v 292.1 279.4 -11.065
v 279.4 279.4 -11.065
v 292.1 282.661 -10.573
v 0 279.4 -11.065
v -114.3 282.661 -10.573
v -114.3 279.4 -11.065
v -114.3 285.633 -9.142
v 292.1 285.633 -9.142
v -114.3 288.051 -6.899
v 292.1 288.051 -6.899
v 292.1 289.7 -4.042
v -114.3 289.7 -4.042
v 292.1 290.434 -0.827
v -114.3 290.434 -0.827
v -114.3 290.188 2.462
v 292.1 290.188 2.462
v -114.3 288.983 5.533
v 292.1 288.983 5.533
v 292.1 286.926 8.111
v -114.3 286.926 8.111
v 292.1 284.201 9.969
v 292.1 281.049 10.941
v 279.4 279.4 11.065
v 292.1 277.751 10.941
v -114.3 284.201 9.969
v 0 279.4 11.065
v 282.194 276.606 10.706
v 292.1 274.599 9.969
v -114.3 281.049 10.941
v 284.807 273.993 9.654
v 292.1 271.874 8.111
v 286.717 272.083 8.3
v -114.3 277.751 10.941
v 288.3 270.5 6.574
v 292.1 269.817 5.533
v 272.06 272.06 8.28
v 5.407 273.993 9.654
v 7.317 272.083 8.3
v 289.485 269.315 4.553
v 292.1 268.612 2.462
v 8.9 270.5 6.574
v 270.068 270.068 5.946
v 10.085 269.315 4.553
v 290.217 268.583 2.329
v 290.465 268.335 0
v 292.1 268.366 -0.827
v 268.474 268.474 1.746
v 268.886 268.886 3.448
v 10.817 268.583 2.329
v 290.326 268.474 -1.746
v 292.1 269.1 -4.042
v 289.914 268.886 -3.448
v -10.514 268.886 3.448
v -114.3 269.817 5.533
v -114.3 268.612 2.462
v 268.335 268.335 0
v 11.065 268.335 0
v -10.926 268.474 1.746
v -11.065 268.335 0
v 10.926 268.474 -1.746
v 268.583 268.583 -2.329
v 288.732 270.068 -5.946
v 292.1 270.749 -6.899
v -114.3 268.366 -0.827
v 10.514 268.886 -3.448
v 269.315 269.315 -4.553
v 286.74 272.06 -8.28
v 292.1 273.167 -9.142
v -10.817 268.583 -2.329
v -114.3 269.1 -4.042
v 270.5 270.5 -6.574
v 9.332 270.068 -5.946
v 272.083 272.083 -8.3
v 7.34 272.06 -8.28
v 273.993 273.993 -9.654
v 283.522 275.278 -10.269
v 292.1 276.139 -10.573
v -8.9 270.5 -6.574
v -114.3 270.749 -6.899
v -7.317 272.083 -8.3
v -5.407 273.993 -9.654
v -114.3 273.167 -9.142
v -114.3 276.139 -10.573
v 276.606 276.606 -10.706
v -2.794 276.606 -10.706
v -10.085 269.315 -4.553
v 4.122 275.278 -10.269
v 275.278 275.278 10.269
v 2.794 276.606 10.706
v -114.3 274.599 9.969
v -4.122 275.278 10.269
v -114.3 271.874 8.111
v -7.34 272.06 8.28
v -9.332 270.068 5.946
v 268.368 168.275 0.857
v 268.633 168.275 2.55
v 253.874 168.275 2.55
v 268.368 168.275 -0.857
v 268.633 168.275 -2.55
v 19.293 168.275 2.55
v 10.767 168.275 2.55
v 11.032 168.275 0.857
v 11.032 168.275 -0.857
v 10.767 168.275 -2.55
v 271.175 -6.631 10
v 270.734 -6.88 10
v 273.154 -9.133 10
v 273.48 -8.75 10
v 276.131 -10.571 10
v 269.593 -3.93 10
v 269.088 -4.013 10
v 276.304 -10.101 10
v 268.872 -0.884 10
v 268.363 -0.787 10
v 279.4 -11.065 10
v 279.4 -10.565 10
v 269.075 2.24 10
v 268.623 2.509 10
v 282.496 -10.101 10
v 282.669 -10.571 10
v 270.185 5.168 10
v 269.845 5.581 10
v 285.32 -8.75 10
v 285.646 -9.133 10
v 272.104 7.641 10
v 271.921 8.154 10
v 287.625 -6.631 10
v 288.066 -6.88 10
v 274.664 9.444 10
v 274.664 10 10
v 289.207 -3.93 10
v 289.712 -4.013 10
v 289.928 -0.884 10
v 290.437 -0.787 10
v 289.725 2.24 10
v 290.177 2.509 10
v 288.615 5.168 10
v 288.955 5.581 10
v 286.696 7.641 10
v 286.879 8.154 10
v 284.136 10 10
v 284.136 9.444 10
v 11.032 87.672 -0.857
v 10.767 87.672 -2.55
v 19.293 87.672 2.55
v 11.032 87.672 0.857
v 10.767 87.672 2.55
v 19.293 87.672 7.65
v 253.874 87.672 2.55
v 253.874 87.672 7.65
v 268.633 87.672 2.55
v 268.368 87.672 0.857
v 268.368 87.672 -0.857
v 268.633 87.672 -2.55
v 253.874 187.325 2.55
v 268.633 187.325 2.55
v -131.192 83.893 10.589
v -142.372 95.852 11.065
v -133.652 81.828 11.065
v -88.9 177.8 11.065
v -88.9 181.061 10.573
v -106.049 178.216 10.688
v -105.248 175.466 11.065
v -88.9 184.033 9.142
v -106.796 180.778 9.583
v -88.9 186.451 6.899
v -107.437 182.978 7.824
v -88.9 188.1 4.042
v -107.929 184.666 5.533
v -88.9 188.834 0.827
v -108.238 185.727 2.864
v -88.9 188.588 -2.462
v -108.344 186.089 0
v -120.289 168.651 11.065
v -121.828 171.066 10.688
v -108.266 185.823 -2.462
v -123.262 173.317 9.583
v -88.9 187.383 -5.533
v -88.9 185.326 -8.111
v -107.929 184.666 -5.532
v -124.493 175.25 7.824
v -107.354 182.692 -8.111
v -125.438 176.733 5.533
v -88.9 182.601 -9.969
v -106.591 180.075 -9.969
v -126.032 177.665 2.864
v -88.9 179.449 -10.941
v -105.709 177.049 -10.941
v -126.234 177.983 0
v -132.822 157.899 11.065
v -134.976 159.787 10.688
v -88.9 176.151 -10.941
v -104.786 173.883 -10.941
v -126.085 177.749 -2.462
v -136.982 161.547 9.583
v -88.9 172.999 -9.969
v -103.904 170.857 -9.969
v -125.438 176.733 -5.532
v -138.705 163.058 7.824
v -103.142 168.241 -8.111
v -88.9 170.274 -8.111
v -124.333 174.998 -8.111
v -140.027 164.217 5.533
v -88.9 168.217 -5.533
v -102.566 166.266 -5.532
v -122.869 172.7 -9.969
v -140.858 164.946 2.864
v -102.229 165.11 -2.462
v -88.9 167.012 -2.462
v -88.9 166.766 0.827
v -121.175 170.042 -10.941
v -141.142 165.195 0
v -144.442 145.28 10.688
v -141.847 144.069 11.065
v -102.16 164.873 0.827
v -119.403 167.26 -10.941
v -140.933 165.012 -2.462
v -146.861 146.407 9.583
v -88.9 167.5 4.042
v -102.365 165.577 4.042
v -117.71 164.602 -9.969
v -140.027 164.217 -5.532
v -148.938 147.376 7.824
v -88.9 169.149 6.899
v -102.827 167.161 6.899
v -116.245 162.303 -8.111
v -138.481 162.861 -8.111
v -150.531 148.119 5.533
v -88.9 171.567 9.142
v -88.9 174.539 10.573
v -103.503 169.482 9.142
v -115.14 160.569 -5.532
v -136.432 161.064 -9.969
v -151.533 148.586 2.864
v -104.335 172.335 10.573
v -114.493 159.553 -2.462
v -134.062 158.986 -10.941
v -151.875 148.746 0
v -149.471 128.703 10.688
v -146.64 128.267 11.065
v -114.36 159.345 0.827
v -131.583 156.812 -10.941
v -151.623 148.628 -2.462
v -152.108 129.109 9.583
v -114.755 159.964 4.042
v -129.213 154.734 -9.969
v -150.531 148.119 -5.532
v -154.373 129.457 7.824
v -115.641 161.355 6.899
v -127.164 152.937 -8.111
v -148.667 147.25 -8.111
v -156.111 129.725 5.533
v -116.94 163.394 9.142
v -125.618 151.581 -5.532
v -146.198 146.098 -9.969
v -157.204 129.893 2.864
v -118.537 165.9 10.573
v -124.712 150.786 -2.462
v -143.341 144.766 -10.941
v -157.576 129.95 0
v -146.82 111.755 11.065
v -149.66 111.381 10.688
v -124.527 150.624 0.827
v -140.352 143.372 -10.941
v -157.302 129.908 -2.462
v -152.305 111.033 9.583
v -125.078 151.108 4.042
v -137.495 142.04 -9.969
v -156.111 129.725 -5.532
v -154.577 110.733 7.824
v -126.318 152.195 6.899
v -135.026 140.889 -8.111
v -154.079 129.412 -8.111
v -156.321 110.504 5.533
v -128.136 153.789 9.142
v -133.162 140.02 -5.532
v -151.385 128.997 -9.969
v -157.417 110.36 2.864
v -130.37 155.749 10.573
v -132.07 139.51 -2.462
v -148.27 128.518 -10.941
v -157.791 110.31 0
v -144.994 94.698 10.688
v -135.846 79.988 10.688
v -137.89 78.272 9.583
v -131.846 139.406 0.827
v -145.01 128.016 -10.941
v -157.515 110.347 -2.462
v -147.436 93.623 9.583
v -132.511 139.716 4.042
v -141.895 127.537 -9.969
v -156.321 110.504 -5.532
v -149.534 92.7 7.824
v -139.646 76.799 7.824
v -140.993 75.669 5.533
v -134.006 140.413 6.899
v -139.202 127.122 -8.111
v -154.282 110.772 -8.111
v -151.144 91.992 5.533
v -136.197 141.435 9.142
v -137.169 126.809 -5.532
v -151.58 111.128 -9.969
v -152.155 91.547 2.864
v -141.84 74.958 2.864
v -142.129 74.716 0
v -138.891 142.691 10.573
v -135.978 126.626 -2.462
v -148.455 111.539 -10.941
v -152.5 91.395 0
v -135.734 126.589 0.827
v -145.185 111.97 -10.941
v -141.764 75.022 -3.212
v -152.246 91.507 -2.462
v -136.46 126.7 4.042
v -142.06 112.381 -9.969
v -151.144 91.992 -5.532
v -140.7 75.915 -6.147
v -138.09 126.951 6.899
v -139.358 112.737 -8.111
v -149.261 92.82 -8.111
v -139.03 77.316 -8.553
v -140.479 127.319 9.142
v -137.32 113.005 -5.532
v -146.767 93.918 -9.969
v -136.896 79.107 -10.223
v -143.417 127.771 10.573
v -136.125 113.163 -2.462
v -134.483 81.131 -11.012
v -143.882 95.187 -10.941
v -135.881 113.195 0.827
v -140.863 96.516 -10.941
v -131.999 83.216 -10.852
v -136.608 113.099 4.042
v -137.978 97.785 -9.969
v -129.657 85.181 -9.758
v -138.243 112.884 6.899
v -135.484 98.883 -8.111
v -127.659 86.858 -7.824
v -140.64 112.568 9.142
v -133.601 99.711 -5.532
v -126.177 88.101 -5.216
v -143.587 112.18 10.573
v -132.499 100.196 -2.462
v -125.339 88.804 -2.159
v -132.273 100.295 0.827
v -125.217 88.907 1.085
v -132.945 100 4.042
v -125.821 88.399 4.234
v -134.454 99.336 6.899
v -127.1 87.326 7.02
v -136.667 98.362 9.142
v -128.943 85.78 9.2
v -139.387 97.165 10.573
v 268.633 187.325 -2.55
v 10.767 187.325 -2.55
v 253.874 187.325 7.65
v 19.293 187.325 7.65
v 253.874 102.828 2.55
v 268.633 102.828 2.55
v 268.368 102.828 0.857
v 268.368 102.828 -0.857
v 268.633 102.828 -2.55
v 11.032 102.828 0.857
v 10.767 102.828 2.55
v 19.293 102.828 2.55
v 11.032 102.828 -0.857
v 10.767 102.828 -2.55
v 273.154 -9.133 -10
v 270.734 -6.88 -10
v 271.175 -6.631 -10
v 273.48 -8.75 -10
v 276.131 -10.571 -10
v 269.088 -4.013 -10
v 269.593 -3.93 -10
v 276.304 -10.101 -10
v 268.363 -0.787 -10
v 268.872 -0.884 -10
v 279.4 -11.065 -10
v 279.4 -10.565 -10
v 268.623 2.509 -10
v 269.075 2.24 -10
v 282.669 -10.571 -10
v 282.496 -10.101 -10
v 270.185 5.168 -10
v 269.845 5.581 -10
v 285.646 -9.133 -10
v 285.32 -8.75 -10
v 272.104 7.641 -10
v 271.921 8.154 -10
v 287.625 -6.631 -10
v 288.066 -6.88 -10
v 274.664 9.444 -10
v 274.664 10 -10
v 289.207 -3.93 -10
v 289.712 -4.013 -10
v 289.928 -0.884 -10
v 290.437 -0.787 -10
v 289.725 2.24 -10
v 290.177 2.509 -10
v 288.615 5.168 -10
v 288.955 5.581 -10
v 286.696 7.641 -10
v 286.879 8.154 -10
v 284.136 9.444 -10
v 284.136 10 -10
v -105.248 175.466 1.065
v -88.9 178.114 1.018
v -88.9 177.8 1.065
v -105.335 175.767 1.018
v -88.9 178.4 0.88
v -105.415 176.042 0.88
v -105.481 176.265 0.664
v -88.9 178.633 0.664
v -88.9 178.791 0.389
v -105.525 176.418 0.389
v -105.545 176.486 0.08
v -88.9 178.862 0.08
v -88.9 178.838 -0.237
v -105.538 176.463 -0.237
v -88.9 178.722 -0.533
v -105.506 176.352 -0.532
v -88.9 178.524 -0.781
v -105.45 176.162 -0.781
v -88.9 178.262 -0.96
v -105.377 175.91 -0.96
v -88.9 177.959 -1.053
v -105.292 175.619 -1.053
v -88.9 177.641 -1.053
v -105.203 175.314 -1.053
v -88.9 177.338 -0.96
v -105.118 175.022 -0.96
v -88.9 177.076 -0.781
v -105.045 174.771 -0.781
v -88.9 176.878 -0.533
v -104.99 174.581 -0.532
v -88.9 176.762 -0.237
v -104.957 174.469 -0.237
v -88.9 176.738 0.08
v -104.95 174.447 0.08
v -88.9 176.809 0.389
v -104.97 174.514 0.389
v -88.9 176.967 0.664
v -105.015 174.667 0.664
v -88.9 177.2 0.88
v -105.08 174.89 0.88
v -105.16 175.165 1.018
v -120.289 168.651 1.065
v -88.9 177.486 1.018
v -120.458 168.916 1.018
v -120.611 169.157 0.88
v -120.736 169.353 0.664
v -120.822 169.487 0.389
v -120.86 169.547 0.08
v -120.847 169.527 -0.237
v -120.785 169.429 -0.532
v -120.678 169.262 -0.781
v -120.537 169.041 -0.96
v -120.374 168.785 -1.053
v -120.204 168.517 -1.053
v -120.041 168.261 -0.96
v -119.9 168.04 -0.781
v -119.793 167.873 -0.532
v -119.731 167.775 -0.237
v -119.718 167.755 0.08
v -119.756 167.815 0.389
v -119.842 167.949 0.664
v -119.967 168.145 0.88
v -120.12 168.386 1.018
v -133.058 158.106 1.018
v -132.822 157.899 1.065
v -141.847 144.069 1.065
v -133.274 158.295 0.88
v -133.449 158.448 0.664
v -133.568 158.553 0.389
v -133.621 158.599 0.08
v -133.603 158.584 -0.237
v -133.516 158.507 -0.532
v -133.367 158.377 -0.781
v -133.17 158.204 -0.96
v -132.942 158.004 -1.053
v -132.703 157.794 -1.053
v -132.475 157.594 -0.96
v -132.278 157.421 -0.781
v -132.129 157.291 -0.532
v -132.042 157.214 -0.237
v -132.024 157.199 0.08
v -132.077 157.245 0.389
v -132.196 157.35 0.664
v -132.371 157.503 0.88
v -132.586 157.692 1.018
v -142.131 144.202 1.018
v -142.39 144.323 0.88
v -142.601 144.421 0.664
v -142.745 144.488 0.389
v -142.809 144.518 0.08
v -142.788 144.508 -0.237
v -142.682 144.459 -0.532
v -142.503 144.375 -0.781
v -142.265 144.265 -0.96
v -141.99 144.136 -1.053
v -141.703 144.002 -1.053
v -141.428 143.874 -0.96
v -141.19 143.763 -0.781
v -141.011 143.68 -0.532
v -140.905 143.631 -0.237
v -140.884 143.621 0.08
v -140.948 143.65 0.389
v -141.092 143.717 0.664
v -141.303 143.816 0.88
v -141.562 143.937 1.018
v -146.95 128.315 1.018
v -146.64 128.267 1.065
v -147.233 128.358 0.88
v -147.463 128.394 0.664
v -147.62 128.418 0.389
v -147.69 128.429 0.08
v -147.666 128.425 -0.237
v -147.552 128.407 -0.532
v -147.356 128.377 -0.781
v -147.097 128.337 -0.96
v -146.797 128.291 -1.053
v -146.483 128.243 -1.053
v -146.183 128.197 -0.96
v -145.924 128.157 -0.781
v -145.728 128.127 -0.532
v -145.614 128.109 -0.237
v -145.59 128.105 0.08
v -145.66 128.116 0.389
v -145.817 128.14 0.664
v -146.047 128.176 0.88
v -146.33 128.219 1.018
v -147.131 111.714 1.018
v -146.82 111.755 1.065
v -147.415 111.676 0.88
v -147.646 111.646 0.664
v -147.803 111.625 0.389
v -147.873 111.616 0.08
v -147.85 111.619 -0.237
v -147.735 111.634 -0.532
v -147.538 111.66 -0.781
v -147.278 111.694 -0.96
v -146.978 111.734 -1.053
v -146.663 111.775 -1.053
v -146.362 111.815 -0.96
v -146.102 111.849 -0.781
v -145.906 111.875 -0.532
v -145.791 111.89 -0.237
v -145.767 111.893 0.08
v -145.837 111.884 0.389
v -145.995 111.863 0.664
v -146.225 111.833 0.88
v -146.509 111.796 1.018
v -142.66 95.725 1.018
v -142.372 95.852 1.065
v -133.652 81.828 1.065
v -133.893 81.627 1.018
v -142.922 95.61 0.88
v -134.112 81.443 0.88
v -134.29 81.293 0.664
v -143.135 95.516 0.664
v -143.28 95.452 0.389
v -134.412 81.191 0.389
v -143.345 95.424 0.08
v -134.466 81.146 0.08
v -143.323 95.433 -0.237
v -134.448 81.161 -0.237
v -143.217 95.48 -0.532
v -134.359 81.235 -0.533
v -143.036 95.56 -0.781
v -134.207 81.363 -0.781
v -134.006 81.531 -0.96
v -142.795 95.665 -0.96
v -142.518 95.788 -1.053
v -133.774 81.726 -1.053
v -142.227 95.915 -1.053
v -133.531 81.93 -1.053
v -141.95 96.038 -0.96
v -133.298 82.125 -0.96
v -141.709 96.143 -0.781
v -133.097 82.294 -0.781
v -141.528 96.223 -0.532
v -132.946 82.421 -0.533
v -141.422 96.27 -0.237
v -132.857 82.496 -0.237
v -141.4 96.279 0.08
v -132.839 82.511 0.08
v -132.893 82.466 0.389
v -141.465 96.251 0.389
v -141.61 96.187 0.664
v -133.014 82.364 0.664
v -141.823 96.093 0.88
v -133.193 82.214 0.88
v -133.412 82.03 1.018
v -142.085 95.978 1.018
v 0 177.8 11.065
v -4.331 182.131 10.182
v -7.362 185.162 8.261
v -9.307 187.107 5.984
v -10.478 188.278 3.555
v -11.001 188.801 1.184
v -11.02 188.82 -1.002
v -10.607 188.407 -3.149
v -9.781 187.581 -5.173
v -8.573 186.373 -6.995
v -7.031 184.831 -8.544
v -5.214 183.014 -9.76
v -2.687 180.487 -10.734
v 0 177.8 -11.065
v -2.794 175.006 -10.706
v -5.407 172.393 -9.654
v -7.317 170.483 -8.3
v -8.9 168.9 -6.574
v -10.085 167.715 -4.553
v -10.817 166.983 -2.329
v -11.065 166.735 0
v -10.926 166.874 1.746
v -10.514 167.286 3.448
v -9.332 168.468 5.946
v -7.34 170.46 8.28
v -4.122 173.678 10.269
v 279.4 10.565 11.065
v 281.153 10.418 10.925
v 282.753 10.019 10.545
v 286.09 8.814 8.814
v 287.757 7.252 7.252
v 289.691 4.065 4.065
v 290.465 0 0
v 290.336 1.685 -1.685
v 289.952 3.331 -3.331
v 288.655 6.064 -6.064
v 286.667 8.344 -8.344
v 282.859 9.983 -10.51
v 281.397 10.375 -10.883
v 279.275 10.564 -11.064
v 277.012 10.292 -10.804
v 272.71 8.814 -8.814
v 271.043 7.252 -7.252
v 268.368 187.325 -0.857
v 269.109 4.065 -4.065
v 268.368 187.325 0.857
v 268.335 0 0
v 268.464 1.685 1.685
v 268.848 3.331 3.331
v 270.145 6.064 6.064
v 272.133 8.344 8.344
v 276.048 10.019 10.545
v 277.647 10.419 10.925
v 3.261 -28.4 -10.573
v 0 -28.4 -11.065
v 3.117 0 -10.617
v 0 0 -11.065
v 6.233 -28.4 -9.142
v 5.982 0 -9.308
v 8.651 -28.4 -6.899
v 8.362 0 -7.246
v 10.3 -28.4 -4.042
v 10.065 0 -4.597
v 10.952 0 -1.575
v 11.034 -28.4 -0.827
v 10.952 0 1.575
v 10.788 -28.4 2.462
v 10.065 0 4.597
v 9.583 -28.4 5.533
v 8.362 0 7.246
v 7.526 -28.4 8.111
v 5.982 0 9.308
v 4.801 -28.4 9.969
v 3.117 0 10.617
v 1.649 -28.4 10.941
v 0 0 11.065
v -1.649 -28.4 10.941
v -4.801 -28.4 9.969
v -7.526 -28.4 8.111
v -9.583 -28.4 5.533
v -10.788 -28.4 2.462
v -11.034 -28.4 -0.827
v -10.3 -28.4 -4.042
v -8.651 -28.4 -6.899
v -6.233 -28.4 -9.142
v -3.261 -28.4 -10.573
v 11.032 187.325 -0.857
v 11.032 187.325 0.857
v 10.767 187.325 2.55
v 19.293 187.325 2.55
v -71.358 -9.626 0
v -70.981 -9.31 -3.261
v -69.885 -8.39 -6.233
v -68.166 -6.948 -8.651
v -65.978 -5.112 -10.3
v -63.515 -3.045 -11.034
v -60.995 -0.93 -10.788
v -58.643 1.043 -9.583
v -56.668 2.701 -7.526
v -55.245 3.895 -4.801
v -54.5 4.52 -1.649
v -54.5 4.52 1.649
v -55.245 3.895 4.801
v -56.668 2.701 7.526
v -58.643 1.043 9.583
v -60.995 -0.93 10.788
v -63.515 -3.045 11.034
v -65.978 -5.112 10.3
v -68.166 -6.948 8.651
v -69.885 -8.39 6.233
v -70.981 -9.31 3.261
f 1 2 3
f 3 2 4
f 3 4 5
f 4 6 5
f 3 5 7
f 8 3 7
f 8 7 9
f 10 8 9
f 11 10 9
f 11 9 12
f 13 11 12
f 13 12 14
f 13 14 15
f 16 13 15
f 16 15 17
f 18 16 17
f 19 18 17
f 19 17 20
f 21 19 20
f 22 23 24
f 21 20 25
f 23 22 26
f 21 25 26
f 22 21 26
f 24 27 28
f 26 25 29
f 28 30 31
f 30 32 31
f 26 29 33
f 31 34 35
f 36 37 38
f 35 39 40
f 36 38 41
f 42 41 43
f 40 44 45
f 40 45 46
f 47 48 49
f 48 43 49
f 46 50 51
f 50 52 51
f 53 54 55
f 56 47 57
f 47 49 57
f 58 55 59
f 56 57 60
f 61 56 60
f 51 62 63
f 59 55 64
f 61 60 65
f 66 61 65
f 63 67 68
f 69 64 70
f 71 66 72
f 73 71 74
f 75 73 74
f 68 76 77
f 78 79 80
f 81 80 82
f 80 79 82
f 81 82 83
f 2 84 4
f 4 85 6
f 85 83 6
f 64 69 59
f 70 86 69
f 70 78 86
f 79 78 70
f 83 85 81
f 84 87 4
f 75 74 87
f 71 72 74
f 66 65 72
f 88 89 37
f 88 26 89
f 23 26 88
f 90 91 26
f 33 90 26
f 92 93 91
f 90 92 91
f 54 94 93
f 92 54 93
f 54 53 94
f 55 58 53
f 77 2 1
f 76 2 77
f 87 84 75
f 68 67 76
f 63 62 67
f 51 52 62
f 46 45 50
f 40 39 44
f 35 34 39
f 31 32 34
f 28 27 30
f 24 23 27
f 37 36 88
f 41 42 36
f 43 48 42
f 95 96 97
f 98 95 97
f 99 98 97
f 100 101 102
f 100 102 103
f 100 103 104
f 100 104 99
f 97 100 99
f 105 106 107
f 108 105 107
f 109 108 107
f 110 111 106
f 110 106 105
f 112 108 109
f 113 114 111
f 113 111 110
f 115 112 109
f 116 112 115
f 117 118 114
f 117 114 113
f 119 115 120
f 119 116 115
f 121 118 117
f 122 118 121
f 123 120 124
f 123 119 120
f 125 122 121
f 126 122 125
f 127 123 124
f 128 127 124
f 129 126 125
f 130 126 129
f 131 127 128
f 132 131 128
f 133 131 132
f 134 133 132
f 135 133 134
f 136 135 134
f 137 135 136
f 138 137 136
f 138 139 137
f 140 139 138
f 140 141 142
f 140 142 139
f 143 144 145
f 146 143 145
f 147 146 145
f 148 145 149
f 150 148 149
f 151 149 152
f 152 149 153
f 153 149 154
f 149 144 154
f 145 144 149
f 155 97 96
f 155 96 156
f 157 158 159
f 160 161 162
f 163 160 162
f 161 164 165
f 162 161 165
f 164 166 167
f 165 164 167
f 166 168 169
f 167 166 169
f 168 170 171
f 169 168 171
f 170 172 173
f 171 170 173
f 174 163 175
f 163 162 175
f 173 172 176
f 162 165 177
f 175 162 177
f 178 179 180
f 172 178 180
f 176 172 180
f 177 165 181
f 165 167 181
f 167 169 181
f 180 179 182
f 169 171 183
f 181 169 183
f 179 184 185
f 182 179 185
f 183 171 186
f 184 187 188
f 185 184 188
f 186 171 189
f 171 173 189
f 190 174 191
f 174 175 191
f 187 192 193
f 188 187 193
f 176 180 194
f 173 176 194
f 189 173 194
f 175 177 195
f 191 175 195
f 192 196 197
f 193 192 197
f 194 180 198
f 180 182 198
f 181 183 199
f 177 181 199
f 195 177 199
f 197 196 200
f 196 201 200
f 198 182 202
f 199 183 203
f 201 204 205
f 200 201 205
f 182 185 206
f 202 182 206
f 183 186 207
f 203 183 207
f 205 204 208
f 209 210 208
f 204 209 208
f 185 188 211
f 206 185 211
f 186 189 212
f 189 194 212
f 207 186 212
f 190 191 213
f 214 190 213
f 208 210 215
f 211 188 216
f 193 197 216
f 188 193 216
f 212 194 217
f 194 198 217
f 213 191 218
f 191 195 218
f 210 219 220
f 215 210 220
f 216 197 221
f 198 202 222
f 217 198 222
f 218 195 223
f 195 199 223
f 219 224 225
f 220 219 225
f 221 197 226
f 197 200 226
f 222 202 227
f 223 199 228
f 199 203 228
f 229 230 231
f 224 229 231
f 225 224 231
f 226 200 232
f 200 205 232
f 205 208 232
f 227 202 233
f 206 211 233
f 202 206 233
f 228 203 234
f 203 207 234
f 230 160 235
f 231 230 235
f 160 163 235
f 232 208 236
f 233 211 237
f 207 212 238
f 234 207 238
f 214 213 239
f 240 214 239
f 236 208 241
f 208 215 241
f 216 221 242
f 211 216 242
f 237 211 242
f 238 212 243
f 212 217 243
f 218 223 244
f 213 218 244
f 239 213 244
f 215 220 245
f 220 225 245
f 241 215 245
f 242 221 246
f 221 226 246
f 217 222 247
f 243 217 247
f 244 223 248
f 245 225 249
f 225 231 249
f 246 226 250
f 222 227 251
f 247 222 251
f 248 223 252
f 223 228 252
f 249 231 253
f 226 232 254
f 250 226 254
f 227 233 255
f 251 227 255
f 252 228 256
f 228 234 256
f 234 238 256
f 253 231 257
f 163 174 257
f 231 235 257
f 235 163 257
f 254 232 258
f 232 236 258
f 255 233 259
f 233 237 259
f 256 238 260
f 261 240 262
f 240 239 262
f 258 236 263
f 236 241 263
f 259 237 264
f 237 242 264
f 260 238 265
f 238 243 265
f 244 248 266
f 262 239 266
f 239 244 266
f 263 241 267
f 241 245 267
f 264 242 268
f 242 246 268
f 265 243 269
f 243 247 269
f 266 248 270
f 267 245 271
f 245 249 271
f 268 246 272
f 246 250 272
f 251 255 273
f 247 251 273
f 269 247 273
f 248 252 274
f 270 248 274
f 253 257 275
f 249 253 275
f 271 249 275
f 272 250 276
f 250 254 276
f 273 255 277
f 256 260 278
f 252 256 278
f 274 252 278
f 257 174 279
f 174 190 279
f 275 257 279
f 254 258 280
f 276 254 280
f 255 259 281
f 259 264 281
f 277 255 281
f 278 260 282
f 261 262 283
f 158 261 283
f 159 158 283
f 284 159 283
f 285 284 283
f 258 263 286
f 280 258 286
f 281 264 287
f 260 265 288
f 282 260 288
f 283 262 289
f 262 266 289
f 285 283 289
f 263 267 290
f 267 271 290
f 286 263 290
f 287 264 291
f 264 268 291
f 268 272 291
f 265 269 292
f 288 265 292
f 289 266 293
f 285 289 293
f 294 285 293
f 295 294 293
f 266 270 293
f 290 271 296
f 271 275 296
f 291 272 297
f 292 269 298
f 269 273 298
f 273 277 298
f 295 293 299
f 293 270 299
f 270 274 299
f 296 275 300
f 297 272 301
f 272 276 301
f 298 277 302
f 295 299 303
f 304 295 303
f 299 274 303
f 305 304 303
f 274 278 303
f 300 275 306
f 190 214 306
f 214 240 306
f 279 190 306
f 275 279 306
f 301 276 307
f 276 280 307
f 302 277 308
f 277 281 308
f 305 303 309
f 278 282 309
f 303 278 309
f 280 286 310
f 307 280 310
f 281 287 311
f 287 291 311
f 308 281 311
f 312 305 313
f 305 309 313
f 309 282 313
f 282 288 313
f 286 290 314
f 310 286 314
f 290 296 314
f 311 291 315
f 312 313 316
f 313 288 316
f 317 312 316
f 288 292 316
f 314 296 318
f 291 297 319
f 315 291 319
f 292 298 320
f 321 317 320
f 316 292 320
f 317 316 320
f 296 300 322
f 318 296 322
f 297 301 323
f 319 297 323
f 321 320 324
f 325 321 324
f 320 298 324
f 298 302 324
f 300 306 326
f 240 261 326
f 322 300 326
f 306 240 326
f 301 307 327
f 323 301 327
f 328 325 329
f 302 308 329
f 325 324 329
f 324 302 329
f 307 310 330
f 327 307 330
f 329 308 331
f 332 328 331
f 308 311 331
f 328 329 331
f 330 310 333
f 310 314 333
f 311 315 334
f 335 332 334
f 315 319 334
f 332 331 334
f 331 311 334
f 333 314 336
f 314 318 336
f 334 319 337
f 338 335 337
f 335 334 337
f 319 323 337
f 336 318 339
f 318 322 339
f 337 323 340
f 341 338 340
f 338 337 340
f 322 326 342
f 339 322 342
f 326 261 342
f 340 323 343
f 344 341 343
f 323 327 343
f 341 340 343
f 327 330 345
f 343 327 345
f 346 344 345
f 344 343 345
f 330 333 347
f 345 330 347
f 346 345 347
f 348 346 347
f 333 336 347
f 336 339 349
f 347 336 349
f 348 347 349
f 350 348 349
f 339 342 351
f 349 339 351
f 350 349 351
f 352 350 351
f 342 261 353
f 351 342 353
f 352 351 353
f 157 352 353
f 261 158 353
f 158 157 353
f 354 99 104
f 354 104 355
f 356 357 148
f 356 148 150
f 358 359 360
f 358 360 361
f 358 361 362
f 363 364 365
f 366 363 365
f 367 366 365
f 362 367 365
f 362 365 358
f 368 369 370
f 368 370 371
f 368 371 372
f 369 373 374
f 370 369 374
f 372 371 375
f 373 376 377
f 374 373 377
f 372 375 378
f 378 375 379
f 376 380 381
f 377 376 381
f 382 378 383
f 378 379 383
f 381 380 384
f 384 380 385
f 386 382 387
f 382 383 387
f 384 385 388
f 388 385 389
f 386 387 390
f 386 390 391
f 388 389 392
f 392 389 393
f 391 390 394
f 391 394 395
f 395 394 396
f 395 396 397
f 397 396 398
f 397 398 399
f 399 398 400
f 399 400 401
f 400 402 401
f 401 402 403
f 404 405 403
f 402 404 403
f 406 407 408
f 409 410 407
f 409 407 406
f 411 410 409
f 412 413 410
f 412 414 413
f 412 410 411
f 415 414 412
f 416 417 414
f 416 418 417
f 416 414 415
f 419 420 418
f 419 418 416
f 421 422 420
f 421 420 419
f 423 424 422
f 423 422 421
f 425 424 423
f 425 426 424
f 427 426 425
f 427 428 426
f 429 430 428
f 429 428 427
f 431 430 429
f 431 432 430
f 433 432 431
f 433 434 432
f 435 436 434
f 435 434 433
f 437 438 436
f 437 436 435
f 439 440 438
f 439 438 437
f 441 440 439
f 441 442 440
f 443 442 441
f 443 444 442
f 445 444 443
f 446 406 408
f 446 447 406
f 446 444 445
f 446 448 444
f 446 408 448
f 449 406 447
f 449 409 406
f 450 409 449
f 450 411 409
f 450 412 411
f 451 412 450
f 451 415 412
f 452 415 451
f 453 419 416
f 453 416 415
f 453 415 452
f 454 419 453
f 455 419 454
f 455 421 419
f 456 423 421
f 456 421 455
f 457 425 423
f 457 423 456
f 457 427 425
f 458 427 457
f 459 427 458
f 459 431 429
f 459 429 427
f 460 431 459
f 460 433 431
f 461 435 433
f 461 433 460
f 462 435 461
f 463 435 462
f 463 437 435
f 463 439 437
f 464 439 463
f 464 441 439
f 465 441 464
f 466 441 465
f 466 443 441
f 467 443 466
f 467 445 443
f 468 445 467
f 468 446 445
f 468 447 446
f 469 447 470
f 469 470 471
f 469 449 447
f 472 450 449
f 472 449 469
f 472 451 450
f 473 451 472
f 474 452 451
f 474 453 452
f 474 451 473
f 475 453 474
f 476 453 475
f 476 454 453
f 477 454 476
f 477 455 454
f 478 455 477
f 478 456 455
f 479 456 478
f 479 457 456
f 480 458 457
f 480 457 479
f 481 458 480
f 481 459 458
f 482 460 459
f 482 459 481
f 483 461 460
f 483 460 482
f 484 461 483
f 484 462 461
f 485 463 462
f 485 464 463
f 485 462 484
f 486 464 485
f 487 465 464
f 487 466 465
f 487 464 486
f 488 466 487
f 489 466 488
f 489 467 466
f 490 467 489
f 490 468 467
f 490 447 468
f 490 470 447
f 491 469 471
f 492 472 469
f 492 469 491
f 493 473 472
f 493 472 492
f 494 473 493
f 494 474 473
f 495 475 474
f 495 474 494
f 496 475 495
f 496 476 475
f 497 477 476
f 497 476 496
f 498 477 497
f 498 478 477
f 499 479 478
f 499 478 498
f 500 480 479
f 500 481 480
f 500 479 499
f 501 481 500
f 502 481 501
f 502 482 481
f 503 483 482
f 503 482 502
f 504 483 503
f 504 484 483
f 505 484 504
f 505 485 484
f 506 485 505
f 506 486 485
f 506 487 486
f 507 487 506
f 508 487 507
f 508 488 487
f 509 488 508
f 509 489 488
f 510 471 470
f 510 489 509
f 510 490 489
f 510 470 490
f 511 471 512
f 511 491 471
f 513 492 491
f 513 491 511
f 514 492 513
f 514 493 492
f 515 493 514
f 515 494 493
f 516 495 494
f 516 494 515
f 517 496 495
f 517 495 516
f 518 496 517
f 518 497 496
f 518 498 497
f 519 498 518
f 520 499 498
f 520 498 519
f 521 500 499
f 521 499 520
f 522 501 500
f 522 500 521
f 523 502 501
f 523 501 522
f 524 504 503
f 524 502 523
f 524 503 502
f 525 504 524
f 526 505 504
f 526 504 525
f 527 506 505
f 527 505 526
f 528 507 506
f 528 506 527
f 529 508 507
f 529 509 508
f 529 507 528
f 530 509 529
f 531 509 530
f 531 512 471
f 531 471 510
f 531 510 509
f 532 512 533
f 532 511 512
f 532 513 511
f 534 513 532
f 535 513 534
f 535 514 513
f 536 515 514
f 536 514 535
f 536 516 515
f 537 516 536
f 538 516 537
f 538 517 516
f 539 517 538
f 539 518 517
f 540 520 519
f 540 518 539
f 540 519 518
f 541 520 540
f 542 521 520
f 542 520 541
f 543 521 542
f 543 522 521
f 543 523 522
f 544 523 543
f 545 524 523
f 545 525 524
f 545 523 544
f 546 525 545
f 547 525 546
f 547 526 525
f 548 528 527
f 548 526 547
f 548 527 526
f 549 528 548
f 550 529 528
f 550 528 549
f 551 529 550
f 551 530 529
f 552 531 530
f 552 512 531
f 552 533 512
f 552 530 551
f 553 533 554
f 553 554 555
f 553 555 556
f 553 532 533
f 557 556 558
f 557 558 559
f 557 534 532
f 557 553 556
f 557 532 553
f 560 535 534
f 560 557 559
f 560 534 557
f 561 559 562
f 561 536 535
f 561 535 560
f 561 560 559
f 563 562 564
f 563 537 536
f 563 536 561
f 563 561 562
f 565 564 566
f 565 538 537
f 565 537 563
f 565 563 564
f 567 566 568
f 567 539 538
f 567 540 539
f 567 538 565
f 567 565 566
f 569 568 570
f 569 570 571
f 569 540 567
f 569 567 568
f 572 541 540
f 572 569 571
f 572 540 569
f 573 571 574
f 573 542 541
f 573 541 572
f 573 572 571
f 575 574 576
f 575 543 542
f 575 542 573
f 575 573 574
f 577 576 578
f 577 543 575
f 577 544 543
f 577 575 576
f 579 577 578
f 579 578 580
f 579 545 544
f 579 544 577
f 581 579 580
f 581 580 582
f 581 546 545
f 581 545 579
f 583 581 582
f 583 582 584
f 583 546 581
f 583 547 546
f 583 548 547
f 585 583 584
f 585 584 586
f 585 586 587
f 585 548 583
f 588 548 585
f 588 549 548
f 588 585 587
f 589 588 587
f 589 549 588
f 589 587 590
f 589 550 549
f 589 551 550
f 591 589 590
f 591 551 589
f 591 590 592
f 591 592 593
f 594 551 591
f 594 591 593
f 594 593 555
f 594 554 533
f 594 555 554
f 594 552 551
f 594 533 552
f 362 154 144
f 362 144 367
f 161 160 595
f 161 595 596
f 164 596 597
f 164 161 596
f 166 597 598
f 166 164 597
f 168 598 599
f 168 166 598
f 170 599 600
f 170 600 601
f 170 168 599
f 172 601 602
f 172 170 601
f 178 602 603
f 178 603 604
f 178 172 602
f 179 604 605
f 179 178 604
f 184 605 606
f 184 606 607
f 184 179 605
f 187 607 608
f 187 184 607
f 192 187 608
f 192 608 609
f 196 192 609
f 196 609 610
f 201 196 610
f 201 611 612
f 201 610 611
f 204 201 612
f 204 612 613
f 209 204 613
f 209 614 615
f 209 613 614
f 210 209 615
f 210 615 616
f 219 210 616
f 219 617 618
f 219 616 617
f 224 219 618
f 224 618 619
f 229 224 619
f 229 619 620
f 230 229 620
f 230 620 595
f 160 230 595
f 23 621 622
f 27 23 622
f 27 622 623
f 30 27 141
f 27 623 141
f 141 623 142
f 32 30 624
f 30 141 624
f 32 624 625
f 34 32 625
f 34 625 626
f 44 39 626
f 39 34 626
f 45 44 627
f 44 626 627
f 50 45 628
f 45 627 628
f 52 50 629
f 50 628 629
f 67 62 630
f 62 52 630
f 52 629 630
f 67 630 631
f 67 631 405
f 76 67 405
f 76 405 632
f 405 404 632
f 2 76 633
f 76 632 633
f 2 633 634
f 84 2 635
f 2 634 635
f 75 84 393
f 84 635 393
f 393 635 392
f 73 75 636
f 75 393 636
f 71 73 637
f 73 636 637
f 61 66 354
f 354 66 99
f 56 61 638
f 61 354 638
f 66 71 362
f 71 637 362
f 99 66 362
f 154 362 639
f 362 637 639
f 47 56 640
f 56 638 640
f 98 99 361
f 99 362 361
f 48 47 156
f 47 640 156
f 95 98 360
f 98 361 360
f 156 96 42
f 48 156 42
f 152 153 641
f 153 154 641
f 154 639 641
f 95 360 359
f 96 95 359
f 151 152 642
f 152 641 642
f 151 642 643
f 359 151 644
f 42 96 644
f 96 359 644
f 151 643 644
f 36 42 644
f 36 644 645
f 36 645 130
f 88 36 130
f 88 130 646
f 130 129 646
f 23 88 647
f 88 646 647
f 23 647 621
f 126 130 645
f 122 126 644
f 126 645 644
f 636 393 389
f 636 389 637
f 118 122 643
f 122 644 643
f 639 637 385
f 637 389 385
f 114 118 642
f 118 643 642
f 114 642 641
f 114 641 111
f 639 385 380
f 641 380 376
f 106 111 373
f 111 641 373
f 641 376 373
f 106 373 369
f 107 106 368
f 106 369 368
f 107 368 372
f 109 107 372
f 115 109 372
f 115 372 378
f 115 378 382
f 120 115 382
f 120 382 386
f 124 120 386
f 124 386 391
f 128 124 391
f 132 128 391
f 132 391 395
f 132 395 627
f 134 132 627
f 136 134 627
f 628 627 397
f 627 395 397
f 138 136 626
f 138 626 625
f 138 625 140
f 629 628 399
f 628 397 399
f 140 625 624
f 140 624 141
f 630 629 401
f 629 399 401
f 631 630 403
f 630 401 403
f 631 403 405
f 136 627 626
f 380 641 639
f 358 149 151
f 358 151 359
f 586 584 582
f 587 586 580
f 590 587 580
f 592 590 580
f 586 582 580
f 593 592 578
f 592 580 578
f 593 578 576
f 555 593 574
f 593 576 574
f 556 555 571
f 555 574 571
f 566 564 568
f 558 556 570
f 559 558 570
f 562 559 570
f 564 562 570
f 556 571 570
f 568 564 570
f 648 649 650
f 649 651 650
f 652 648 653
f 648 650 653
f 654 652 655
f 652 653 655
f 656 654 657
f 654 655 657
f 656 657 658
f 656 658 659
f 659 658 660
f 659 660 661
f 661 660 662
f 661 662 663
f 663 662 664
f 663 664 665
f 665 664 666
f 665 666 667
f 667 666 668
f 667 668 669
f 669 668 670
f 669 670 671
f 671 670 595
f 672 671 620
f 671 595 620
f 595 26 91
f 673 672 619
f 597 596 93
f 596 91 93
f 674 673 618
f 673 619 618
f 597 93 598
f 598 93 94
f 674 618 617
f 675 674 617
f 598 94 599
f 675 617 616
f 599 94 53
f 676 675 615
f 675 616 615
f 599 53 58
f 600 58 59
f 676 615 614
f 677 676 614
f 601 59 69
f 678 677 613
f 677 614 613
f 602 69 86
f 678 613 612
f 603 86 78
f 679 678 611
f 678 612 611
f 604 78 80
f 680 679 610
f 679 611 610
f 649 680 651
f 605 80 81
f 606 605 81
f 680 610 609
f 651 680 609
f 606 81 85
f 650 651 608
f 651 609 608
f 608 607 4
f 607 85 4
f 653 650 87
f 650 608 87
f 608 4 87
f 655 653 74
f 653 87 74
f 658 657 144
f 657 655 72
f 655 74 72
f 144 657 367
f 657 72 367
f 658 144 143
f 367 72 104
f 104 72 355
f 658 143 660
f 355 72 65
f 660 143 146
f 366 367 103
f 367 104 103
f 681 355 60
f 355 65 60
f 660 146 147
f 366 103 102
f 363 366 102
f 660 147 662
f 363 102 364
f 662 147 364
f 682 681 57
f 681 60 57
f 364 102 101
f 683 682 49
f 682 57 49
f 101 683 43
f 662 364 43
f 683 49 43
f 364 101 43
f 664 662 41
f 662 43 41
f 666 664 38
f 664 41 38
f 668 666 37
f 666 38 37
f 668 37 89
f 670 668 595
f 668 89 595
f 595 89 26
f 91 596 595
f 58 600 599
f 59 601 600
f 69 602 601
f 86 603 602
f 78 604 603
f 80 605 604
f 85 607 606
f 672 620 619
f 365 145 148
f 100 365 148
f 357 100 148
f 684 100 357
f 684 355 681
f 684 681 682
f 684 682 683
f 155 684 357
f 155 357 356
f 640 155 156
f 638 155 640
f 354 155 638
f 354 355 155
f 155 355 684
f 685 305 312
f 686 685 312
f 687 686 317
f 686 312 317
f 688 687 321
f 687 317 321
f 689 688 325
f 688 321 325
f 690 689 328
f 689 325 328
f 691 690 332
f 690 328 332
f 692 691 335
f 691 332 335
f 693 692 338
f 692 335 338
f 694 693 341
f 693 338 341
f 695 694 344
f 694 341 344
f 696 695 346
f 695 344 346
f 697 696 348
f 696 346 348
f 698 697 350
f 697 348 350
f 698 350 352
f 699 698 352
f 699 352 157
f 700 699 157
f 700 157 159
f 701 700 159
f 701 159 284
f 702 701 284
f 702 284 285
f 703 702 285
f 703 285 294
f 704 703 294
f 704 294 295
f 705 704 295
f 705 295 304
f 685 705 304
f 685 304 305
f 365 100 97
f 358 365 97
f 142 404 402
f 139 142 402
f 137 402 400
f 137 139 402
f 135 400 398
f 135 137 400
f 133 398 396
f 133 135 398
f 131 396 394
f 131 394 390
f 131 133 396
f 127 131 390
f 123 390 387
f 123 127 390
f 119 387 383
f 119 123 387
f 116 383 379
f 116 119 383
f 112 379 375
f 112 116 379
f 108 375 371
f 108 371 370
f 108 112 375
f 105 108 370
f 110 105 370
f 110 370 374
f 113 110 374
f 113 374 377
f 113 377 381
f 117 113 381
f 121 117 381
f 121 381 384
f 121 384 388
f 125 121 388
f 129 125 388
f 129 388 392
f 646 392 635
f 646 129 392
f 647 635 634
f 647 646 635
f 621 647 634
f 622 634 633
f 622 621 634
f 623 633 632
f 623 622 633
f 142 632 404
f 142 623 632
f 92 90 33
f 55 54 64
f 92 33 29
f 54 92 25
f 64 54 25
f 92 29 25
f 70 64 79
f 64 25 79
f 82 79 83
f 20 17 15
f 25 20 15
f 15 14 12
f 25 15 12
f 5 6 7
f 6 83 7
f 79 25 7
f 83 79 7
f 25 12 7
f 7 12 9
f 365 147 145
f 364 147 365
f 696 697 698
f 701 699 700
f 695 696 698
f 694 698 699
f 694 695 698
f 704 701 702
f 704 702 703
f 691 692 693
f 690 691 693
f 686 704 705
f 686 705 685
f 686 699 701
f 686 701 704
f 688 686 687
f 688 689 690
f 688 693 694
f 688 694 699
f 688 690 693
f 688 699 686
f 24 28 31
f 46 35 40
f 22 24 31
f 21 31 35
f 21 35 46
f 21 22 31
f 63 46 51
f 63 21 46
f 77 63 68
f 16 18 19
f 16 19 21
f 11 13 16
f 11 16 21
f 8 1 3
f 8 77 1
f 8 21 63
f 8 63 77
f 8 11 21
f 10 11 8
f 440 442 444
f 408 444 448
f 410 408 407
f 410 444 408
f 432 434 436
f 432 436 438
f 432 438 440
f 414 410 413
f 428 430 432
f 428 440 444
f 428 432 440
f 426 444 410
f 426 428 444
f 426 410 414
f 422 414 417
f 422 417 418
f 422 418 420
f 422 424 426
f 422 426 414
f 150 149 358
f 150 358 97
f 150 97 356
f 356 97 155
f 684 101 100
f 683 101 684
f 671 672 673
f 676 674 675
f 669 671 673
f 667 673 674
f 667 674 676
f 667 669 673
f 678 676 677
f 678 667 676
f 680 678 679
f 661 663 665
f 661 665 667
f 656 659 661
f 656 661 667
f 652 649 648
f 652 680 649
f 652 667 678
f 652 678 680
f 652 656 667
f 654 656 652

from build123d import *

# Parameters (mm, degrees)
SKETCH1_R            = 11.065
EXTRUDE1_DEPTH       = 279.4
EXTRUDE1_2_DEPTH     = 279.4
EXTRUDE2_DEPTH       = 292.1
EXTRUDE2_DEPTH_BACK  = 114.3
SKETCH2_R            = 11.065
SKETCH3_R            = 11.065
EXTRUDE3_DEPTH       = 114.3
EXTRUDE5_DEPTH       = 413.085865385
EXTRUDE5_DEPTH_BACK  = 413.085865385
SKETCH5_W            = 50.8
SKETCH5_H            = 22.13
SKETCH7_R            = 11.065
SKETCH7_R_2          = 1.065
SKETCH7_W            = 28.83710894
SKETCH7_H            = 10
REVOLVE_THIN3_ANGLE  = 130
SKETCH10_R           = 11.065
EXTRUDE6_DEPTH       = 110.1
SKETCH11_W           = 5.1
SKETCH11_H           = 19.05
SKETCH11_H_2         = 15.156574232
EXTRUDE7_DEPTH       = 279.4
SKETCH12_W           = 234.581497294
SKETCH12_H           = 99.653287116
EXTRUDE8_DEPTH       = 5.1
EXTRUDE9_DEPTH       = 10
EXTRUDE9_DEPTH_BACK  = 10
SKETCH13_R           = 11.065
SKETCH13_R_2         = 10.565
EXTRUDE10_DEPTH      = 413.475527097
EXTRUDE10_DEPTH_BACK = 413.475527097
SKETCH14_R           = 10.565
SKETCH15_R           = 11.065
EXTRUDE11_DEPTH      = 28.4


with BuildPart() as part:
    # Sketch1 → Extrude1 (new body)
    with BuildSketch(Plane(origin=(0, 0, 0), x_dir=(1, 0, 0), z_dir=(0, 1, 0))):
        with Locations(Location((0, 0, 0), (0, 0, 270))):
            Circle(SKETCH1_R)
    extrude(amount=EXTRUDE1_DEPTH)



with BuildPart() as body_2:
    # Sketch1 → Extrude1 2 (new body)
    with BuildSketch(Plane(origin=(0, 0, 0), x_dir=(1, 0, 0), z_dir=(0, 1, 0))):
        with Locations(Location((279.4, 0, 0), (0, 0, 270))):
            Circle(SKETCH1_R)
    extrude(amount=EXTRUDE1_2_DEPTH)


with BuildPart() as part_1:
    add(part.part)

    add(body_2.part)  # Extrude2 merges body 2
    # Sketch2 → Extrude2 (add, two sides: drawn at the far end of the back side and taken through both)
    with BuildSketch(Plane(origin=(0, 0, 0), x_dir=(0, 0, -1), z_dir=(1, 0, 0)).offset(-EXTRUDE2_DEPTH_BACK)):
        with Locations((0, 279.4)):
            Circle(SKETCH2_R)
    extrude(amount=EXTRUDE2_DEPTH + EXTRUDE2_DEPTH_BACK)

    # Sketch3 → Extrude3 (add)
    with BuildSketch(Plane.ZY.offset(114.3)):
        with Locations((0, 177.8)):
            Circle(SKETCH3_R)
    extrude(amount=-EXTRUDE3_DEPTH)

    # Sketch5 → Extrude5 (cut, two sides: drawn at the far end of the back side and taken through both)
    with BuildSketch(Plane.XY.offset(-EXTRUDE5_DEPTH_BACK)):
        with Locations((-114.3, 177.8)):
            Rectangle(SKETCH5_W, SKETCH5_H)
    extrude(amount=EXTRUDE5_DEPTH + EXTRUDE5_DEPTH_BACK, mode=Mode.SUBTRACT)

    # Sketch7 → Revolve-Thin3 (revolve)
    # profile 1 of 2: a face of its own
    with BuildSketch(Plane.ZY.offset(88.9)):
        with Locations((0, 177.8)):
            Circle(SKETCH7_R)
        with Locations((0, 177.8)):
            Circle(SKETCH7_R_2, mode=Mode.SUBTRACT)
    # profile 2 of 2: a face of its own
    with BuildSketch(Plane.ZY.offset(88.9)):
        with Locations((14.41855447, 124.38)):
            Rectangle(SKETCH7_W, SKETCH7_H)
    revolve(axis=Axis((-88.9, 119.38, 0), (0, 0, 1)), revolution_arc=REVOLVE_THIN3_ANGLE)


with BuildPart() as revolve_thin3_kept_piece:
    # of the separate pieces the step leaves, the one the design keeps (revolve_thin3_pieces_kept)
    add(part_1.part.solids().sort_by_distance((0, 0, 11.065))[0])

    # Sketch10 → Extrude6 (add)
    with BuildSketch(Plane(origin=(-95.51451328, 113.829764346, 0), x_dir=(0.7660444431189746, 0.6427876096865435, 0), z_dir=(0.6427876096865435, -0.7660444431189746, 0))):
        with Locations(Location((-49.785366149, 0, 0), (0, 0, 180))):
            Circle(SKETCH10_R)
    extrude(amount=EXTRUDE6_DEPTH)

    # Sketch11 → Extrude7 (add)
    with BuildSketch(Plane(origin=(0, 0, 0), x_dir=(0, 0, -1), z_dir=(1, 0, 0))):
        with Locations((0, 177.8)):
            Rectangle(SKETCH11_W, SKETCH11_H)
        with Locations((0, 95.25)):
            Rectangle(SKETCH11_W, SKETCH11_H_2)
    extrude(amount=EXTRUDE7_DEPTH)

    # Sketch12 → Extrude8 (add)
    with BuildSketch(Plane.XY.offset(2.55)):
        with Locations((136.583327193, 137.498356442)):
            Rectangle(SKETCH12_W, SKETCH12_H)
    extrude(amount=EXTRUDE8_DEPTH)


with BuildPart() as extrude9_tool:
    # Sketch13 → Extrude9 (new, two sides: drawn at the far end of the back side and taken through both)
    with BuildSketch(Plane.XY.offset(-EXTRUDE9_DEPTH_BACK)):
        with Locations((279.4, 0)):
            Circle(SKETCH13_R)
        with Locations((279.4, 0)):
            Circle(SKETCH13_R_2, mode=Mode.SUBTRACT)
    extrude(amount=EXTRUDE9_DEPTH + EXTRUDE9_DEPTH_BACK)


with BuildPart() as revolve_thin3_kept_piece_1:
    add(revolve_thin3_kept_piece.part)


with BuildPart() as revolve_thin3_kept_piece_2:
    # Extrude9: joined with extrude9_tool
    add(revolve_thin3_kept_piece_1.part.fuse(extrude9_tool.part, tol=0.00001))

    # Sketch14 → Extrude10 (cut, two sides: drawn at the far end of the back side and taken through both)
    with BuildSketch(Plane(origin=(0, 0, -10), x_dir=(-1, 0, 0), z_dir=(0, 0, -1)).offset(-EXTRUDE10_DEPTH_BACK)):
        with Locations(Location((-279.4, 0, 0), (0, 0, 116.635810294))):
            Circle(SKETCH14_R)
    extrude(amount=EXTRUDE10_DEPTH + EXTRUDE10_DEPTH_BACK, mode=Mode.SUBTRACT)

    # Sketch15 → Extrude11 (add)
    with BuildSketch(Plane.XZ):
        with Locations(Location((0, 0, 0), (0, 0, 270))):
            Circle(SKETCH15_R)
    extrude(amount=EXTRUDE11_DEPTH)


solid = revolve_thin3_kept_piece_2.part
